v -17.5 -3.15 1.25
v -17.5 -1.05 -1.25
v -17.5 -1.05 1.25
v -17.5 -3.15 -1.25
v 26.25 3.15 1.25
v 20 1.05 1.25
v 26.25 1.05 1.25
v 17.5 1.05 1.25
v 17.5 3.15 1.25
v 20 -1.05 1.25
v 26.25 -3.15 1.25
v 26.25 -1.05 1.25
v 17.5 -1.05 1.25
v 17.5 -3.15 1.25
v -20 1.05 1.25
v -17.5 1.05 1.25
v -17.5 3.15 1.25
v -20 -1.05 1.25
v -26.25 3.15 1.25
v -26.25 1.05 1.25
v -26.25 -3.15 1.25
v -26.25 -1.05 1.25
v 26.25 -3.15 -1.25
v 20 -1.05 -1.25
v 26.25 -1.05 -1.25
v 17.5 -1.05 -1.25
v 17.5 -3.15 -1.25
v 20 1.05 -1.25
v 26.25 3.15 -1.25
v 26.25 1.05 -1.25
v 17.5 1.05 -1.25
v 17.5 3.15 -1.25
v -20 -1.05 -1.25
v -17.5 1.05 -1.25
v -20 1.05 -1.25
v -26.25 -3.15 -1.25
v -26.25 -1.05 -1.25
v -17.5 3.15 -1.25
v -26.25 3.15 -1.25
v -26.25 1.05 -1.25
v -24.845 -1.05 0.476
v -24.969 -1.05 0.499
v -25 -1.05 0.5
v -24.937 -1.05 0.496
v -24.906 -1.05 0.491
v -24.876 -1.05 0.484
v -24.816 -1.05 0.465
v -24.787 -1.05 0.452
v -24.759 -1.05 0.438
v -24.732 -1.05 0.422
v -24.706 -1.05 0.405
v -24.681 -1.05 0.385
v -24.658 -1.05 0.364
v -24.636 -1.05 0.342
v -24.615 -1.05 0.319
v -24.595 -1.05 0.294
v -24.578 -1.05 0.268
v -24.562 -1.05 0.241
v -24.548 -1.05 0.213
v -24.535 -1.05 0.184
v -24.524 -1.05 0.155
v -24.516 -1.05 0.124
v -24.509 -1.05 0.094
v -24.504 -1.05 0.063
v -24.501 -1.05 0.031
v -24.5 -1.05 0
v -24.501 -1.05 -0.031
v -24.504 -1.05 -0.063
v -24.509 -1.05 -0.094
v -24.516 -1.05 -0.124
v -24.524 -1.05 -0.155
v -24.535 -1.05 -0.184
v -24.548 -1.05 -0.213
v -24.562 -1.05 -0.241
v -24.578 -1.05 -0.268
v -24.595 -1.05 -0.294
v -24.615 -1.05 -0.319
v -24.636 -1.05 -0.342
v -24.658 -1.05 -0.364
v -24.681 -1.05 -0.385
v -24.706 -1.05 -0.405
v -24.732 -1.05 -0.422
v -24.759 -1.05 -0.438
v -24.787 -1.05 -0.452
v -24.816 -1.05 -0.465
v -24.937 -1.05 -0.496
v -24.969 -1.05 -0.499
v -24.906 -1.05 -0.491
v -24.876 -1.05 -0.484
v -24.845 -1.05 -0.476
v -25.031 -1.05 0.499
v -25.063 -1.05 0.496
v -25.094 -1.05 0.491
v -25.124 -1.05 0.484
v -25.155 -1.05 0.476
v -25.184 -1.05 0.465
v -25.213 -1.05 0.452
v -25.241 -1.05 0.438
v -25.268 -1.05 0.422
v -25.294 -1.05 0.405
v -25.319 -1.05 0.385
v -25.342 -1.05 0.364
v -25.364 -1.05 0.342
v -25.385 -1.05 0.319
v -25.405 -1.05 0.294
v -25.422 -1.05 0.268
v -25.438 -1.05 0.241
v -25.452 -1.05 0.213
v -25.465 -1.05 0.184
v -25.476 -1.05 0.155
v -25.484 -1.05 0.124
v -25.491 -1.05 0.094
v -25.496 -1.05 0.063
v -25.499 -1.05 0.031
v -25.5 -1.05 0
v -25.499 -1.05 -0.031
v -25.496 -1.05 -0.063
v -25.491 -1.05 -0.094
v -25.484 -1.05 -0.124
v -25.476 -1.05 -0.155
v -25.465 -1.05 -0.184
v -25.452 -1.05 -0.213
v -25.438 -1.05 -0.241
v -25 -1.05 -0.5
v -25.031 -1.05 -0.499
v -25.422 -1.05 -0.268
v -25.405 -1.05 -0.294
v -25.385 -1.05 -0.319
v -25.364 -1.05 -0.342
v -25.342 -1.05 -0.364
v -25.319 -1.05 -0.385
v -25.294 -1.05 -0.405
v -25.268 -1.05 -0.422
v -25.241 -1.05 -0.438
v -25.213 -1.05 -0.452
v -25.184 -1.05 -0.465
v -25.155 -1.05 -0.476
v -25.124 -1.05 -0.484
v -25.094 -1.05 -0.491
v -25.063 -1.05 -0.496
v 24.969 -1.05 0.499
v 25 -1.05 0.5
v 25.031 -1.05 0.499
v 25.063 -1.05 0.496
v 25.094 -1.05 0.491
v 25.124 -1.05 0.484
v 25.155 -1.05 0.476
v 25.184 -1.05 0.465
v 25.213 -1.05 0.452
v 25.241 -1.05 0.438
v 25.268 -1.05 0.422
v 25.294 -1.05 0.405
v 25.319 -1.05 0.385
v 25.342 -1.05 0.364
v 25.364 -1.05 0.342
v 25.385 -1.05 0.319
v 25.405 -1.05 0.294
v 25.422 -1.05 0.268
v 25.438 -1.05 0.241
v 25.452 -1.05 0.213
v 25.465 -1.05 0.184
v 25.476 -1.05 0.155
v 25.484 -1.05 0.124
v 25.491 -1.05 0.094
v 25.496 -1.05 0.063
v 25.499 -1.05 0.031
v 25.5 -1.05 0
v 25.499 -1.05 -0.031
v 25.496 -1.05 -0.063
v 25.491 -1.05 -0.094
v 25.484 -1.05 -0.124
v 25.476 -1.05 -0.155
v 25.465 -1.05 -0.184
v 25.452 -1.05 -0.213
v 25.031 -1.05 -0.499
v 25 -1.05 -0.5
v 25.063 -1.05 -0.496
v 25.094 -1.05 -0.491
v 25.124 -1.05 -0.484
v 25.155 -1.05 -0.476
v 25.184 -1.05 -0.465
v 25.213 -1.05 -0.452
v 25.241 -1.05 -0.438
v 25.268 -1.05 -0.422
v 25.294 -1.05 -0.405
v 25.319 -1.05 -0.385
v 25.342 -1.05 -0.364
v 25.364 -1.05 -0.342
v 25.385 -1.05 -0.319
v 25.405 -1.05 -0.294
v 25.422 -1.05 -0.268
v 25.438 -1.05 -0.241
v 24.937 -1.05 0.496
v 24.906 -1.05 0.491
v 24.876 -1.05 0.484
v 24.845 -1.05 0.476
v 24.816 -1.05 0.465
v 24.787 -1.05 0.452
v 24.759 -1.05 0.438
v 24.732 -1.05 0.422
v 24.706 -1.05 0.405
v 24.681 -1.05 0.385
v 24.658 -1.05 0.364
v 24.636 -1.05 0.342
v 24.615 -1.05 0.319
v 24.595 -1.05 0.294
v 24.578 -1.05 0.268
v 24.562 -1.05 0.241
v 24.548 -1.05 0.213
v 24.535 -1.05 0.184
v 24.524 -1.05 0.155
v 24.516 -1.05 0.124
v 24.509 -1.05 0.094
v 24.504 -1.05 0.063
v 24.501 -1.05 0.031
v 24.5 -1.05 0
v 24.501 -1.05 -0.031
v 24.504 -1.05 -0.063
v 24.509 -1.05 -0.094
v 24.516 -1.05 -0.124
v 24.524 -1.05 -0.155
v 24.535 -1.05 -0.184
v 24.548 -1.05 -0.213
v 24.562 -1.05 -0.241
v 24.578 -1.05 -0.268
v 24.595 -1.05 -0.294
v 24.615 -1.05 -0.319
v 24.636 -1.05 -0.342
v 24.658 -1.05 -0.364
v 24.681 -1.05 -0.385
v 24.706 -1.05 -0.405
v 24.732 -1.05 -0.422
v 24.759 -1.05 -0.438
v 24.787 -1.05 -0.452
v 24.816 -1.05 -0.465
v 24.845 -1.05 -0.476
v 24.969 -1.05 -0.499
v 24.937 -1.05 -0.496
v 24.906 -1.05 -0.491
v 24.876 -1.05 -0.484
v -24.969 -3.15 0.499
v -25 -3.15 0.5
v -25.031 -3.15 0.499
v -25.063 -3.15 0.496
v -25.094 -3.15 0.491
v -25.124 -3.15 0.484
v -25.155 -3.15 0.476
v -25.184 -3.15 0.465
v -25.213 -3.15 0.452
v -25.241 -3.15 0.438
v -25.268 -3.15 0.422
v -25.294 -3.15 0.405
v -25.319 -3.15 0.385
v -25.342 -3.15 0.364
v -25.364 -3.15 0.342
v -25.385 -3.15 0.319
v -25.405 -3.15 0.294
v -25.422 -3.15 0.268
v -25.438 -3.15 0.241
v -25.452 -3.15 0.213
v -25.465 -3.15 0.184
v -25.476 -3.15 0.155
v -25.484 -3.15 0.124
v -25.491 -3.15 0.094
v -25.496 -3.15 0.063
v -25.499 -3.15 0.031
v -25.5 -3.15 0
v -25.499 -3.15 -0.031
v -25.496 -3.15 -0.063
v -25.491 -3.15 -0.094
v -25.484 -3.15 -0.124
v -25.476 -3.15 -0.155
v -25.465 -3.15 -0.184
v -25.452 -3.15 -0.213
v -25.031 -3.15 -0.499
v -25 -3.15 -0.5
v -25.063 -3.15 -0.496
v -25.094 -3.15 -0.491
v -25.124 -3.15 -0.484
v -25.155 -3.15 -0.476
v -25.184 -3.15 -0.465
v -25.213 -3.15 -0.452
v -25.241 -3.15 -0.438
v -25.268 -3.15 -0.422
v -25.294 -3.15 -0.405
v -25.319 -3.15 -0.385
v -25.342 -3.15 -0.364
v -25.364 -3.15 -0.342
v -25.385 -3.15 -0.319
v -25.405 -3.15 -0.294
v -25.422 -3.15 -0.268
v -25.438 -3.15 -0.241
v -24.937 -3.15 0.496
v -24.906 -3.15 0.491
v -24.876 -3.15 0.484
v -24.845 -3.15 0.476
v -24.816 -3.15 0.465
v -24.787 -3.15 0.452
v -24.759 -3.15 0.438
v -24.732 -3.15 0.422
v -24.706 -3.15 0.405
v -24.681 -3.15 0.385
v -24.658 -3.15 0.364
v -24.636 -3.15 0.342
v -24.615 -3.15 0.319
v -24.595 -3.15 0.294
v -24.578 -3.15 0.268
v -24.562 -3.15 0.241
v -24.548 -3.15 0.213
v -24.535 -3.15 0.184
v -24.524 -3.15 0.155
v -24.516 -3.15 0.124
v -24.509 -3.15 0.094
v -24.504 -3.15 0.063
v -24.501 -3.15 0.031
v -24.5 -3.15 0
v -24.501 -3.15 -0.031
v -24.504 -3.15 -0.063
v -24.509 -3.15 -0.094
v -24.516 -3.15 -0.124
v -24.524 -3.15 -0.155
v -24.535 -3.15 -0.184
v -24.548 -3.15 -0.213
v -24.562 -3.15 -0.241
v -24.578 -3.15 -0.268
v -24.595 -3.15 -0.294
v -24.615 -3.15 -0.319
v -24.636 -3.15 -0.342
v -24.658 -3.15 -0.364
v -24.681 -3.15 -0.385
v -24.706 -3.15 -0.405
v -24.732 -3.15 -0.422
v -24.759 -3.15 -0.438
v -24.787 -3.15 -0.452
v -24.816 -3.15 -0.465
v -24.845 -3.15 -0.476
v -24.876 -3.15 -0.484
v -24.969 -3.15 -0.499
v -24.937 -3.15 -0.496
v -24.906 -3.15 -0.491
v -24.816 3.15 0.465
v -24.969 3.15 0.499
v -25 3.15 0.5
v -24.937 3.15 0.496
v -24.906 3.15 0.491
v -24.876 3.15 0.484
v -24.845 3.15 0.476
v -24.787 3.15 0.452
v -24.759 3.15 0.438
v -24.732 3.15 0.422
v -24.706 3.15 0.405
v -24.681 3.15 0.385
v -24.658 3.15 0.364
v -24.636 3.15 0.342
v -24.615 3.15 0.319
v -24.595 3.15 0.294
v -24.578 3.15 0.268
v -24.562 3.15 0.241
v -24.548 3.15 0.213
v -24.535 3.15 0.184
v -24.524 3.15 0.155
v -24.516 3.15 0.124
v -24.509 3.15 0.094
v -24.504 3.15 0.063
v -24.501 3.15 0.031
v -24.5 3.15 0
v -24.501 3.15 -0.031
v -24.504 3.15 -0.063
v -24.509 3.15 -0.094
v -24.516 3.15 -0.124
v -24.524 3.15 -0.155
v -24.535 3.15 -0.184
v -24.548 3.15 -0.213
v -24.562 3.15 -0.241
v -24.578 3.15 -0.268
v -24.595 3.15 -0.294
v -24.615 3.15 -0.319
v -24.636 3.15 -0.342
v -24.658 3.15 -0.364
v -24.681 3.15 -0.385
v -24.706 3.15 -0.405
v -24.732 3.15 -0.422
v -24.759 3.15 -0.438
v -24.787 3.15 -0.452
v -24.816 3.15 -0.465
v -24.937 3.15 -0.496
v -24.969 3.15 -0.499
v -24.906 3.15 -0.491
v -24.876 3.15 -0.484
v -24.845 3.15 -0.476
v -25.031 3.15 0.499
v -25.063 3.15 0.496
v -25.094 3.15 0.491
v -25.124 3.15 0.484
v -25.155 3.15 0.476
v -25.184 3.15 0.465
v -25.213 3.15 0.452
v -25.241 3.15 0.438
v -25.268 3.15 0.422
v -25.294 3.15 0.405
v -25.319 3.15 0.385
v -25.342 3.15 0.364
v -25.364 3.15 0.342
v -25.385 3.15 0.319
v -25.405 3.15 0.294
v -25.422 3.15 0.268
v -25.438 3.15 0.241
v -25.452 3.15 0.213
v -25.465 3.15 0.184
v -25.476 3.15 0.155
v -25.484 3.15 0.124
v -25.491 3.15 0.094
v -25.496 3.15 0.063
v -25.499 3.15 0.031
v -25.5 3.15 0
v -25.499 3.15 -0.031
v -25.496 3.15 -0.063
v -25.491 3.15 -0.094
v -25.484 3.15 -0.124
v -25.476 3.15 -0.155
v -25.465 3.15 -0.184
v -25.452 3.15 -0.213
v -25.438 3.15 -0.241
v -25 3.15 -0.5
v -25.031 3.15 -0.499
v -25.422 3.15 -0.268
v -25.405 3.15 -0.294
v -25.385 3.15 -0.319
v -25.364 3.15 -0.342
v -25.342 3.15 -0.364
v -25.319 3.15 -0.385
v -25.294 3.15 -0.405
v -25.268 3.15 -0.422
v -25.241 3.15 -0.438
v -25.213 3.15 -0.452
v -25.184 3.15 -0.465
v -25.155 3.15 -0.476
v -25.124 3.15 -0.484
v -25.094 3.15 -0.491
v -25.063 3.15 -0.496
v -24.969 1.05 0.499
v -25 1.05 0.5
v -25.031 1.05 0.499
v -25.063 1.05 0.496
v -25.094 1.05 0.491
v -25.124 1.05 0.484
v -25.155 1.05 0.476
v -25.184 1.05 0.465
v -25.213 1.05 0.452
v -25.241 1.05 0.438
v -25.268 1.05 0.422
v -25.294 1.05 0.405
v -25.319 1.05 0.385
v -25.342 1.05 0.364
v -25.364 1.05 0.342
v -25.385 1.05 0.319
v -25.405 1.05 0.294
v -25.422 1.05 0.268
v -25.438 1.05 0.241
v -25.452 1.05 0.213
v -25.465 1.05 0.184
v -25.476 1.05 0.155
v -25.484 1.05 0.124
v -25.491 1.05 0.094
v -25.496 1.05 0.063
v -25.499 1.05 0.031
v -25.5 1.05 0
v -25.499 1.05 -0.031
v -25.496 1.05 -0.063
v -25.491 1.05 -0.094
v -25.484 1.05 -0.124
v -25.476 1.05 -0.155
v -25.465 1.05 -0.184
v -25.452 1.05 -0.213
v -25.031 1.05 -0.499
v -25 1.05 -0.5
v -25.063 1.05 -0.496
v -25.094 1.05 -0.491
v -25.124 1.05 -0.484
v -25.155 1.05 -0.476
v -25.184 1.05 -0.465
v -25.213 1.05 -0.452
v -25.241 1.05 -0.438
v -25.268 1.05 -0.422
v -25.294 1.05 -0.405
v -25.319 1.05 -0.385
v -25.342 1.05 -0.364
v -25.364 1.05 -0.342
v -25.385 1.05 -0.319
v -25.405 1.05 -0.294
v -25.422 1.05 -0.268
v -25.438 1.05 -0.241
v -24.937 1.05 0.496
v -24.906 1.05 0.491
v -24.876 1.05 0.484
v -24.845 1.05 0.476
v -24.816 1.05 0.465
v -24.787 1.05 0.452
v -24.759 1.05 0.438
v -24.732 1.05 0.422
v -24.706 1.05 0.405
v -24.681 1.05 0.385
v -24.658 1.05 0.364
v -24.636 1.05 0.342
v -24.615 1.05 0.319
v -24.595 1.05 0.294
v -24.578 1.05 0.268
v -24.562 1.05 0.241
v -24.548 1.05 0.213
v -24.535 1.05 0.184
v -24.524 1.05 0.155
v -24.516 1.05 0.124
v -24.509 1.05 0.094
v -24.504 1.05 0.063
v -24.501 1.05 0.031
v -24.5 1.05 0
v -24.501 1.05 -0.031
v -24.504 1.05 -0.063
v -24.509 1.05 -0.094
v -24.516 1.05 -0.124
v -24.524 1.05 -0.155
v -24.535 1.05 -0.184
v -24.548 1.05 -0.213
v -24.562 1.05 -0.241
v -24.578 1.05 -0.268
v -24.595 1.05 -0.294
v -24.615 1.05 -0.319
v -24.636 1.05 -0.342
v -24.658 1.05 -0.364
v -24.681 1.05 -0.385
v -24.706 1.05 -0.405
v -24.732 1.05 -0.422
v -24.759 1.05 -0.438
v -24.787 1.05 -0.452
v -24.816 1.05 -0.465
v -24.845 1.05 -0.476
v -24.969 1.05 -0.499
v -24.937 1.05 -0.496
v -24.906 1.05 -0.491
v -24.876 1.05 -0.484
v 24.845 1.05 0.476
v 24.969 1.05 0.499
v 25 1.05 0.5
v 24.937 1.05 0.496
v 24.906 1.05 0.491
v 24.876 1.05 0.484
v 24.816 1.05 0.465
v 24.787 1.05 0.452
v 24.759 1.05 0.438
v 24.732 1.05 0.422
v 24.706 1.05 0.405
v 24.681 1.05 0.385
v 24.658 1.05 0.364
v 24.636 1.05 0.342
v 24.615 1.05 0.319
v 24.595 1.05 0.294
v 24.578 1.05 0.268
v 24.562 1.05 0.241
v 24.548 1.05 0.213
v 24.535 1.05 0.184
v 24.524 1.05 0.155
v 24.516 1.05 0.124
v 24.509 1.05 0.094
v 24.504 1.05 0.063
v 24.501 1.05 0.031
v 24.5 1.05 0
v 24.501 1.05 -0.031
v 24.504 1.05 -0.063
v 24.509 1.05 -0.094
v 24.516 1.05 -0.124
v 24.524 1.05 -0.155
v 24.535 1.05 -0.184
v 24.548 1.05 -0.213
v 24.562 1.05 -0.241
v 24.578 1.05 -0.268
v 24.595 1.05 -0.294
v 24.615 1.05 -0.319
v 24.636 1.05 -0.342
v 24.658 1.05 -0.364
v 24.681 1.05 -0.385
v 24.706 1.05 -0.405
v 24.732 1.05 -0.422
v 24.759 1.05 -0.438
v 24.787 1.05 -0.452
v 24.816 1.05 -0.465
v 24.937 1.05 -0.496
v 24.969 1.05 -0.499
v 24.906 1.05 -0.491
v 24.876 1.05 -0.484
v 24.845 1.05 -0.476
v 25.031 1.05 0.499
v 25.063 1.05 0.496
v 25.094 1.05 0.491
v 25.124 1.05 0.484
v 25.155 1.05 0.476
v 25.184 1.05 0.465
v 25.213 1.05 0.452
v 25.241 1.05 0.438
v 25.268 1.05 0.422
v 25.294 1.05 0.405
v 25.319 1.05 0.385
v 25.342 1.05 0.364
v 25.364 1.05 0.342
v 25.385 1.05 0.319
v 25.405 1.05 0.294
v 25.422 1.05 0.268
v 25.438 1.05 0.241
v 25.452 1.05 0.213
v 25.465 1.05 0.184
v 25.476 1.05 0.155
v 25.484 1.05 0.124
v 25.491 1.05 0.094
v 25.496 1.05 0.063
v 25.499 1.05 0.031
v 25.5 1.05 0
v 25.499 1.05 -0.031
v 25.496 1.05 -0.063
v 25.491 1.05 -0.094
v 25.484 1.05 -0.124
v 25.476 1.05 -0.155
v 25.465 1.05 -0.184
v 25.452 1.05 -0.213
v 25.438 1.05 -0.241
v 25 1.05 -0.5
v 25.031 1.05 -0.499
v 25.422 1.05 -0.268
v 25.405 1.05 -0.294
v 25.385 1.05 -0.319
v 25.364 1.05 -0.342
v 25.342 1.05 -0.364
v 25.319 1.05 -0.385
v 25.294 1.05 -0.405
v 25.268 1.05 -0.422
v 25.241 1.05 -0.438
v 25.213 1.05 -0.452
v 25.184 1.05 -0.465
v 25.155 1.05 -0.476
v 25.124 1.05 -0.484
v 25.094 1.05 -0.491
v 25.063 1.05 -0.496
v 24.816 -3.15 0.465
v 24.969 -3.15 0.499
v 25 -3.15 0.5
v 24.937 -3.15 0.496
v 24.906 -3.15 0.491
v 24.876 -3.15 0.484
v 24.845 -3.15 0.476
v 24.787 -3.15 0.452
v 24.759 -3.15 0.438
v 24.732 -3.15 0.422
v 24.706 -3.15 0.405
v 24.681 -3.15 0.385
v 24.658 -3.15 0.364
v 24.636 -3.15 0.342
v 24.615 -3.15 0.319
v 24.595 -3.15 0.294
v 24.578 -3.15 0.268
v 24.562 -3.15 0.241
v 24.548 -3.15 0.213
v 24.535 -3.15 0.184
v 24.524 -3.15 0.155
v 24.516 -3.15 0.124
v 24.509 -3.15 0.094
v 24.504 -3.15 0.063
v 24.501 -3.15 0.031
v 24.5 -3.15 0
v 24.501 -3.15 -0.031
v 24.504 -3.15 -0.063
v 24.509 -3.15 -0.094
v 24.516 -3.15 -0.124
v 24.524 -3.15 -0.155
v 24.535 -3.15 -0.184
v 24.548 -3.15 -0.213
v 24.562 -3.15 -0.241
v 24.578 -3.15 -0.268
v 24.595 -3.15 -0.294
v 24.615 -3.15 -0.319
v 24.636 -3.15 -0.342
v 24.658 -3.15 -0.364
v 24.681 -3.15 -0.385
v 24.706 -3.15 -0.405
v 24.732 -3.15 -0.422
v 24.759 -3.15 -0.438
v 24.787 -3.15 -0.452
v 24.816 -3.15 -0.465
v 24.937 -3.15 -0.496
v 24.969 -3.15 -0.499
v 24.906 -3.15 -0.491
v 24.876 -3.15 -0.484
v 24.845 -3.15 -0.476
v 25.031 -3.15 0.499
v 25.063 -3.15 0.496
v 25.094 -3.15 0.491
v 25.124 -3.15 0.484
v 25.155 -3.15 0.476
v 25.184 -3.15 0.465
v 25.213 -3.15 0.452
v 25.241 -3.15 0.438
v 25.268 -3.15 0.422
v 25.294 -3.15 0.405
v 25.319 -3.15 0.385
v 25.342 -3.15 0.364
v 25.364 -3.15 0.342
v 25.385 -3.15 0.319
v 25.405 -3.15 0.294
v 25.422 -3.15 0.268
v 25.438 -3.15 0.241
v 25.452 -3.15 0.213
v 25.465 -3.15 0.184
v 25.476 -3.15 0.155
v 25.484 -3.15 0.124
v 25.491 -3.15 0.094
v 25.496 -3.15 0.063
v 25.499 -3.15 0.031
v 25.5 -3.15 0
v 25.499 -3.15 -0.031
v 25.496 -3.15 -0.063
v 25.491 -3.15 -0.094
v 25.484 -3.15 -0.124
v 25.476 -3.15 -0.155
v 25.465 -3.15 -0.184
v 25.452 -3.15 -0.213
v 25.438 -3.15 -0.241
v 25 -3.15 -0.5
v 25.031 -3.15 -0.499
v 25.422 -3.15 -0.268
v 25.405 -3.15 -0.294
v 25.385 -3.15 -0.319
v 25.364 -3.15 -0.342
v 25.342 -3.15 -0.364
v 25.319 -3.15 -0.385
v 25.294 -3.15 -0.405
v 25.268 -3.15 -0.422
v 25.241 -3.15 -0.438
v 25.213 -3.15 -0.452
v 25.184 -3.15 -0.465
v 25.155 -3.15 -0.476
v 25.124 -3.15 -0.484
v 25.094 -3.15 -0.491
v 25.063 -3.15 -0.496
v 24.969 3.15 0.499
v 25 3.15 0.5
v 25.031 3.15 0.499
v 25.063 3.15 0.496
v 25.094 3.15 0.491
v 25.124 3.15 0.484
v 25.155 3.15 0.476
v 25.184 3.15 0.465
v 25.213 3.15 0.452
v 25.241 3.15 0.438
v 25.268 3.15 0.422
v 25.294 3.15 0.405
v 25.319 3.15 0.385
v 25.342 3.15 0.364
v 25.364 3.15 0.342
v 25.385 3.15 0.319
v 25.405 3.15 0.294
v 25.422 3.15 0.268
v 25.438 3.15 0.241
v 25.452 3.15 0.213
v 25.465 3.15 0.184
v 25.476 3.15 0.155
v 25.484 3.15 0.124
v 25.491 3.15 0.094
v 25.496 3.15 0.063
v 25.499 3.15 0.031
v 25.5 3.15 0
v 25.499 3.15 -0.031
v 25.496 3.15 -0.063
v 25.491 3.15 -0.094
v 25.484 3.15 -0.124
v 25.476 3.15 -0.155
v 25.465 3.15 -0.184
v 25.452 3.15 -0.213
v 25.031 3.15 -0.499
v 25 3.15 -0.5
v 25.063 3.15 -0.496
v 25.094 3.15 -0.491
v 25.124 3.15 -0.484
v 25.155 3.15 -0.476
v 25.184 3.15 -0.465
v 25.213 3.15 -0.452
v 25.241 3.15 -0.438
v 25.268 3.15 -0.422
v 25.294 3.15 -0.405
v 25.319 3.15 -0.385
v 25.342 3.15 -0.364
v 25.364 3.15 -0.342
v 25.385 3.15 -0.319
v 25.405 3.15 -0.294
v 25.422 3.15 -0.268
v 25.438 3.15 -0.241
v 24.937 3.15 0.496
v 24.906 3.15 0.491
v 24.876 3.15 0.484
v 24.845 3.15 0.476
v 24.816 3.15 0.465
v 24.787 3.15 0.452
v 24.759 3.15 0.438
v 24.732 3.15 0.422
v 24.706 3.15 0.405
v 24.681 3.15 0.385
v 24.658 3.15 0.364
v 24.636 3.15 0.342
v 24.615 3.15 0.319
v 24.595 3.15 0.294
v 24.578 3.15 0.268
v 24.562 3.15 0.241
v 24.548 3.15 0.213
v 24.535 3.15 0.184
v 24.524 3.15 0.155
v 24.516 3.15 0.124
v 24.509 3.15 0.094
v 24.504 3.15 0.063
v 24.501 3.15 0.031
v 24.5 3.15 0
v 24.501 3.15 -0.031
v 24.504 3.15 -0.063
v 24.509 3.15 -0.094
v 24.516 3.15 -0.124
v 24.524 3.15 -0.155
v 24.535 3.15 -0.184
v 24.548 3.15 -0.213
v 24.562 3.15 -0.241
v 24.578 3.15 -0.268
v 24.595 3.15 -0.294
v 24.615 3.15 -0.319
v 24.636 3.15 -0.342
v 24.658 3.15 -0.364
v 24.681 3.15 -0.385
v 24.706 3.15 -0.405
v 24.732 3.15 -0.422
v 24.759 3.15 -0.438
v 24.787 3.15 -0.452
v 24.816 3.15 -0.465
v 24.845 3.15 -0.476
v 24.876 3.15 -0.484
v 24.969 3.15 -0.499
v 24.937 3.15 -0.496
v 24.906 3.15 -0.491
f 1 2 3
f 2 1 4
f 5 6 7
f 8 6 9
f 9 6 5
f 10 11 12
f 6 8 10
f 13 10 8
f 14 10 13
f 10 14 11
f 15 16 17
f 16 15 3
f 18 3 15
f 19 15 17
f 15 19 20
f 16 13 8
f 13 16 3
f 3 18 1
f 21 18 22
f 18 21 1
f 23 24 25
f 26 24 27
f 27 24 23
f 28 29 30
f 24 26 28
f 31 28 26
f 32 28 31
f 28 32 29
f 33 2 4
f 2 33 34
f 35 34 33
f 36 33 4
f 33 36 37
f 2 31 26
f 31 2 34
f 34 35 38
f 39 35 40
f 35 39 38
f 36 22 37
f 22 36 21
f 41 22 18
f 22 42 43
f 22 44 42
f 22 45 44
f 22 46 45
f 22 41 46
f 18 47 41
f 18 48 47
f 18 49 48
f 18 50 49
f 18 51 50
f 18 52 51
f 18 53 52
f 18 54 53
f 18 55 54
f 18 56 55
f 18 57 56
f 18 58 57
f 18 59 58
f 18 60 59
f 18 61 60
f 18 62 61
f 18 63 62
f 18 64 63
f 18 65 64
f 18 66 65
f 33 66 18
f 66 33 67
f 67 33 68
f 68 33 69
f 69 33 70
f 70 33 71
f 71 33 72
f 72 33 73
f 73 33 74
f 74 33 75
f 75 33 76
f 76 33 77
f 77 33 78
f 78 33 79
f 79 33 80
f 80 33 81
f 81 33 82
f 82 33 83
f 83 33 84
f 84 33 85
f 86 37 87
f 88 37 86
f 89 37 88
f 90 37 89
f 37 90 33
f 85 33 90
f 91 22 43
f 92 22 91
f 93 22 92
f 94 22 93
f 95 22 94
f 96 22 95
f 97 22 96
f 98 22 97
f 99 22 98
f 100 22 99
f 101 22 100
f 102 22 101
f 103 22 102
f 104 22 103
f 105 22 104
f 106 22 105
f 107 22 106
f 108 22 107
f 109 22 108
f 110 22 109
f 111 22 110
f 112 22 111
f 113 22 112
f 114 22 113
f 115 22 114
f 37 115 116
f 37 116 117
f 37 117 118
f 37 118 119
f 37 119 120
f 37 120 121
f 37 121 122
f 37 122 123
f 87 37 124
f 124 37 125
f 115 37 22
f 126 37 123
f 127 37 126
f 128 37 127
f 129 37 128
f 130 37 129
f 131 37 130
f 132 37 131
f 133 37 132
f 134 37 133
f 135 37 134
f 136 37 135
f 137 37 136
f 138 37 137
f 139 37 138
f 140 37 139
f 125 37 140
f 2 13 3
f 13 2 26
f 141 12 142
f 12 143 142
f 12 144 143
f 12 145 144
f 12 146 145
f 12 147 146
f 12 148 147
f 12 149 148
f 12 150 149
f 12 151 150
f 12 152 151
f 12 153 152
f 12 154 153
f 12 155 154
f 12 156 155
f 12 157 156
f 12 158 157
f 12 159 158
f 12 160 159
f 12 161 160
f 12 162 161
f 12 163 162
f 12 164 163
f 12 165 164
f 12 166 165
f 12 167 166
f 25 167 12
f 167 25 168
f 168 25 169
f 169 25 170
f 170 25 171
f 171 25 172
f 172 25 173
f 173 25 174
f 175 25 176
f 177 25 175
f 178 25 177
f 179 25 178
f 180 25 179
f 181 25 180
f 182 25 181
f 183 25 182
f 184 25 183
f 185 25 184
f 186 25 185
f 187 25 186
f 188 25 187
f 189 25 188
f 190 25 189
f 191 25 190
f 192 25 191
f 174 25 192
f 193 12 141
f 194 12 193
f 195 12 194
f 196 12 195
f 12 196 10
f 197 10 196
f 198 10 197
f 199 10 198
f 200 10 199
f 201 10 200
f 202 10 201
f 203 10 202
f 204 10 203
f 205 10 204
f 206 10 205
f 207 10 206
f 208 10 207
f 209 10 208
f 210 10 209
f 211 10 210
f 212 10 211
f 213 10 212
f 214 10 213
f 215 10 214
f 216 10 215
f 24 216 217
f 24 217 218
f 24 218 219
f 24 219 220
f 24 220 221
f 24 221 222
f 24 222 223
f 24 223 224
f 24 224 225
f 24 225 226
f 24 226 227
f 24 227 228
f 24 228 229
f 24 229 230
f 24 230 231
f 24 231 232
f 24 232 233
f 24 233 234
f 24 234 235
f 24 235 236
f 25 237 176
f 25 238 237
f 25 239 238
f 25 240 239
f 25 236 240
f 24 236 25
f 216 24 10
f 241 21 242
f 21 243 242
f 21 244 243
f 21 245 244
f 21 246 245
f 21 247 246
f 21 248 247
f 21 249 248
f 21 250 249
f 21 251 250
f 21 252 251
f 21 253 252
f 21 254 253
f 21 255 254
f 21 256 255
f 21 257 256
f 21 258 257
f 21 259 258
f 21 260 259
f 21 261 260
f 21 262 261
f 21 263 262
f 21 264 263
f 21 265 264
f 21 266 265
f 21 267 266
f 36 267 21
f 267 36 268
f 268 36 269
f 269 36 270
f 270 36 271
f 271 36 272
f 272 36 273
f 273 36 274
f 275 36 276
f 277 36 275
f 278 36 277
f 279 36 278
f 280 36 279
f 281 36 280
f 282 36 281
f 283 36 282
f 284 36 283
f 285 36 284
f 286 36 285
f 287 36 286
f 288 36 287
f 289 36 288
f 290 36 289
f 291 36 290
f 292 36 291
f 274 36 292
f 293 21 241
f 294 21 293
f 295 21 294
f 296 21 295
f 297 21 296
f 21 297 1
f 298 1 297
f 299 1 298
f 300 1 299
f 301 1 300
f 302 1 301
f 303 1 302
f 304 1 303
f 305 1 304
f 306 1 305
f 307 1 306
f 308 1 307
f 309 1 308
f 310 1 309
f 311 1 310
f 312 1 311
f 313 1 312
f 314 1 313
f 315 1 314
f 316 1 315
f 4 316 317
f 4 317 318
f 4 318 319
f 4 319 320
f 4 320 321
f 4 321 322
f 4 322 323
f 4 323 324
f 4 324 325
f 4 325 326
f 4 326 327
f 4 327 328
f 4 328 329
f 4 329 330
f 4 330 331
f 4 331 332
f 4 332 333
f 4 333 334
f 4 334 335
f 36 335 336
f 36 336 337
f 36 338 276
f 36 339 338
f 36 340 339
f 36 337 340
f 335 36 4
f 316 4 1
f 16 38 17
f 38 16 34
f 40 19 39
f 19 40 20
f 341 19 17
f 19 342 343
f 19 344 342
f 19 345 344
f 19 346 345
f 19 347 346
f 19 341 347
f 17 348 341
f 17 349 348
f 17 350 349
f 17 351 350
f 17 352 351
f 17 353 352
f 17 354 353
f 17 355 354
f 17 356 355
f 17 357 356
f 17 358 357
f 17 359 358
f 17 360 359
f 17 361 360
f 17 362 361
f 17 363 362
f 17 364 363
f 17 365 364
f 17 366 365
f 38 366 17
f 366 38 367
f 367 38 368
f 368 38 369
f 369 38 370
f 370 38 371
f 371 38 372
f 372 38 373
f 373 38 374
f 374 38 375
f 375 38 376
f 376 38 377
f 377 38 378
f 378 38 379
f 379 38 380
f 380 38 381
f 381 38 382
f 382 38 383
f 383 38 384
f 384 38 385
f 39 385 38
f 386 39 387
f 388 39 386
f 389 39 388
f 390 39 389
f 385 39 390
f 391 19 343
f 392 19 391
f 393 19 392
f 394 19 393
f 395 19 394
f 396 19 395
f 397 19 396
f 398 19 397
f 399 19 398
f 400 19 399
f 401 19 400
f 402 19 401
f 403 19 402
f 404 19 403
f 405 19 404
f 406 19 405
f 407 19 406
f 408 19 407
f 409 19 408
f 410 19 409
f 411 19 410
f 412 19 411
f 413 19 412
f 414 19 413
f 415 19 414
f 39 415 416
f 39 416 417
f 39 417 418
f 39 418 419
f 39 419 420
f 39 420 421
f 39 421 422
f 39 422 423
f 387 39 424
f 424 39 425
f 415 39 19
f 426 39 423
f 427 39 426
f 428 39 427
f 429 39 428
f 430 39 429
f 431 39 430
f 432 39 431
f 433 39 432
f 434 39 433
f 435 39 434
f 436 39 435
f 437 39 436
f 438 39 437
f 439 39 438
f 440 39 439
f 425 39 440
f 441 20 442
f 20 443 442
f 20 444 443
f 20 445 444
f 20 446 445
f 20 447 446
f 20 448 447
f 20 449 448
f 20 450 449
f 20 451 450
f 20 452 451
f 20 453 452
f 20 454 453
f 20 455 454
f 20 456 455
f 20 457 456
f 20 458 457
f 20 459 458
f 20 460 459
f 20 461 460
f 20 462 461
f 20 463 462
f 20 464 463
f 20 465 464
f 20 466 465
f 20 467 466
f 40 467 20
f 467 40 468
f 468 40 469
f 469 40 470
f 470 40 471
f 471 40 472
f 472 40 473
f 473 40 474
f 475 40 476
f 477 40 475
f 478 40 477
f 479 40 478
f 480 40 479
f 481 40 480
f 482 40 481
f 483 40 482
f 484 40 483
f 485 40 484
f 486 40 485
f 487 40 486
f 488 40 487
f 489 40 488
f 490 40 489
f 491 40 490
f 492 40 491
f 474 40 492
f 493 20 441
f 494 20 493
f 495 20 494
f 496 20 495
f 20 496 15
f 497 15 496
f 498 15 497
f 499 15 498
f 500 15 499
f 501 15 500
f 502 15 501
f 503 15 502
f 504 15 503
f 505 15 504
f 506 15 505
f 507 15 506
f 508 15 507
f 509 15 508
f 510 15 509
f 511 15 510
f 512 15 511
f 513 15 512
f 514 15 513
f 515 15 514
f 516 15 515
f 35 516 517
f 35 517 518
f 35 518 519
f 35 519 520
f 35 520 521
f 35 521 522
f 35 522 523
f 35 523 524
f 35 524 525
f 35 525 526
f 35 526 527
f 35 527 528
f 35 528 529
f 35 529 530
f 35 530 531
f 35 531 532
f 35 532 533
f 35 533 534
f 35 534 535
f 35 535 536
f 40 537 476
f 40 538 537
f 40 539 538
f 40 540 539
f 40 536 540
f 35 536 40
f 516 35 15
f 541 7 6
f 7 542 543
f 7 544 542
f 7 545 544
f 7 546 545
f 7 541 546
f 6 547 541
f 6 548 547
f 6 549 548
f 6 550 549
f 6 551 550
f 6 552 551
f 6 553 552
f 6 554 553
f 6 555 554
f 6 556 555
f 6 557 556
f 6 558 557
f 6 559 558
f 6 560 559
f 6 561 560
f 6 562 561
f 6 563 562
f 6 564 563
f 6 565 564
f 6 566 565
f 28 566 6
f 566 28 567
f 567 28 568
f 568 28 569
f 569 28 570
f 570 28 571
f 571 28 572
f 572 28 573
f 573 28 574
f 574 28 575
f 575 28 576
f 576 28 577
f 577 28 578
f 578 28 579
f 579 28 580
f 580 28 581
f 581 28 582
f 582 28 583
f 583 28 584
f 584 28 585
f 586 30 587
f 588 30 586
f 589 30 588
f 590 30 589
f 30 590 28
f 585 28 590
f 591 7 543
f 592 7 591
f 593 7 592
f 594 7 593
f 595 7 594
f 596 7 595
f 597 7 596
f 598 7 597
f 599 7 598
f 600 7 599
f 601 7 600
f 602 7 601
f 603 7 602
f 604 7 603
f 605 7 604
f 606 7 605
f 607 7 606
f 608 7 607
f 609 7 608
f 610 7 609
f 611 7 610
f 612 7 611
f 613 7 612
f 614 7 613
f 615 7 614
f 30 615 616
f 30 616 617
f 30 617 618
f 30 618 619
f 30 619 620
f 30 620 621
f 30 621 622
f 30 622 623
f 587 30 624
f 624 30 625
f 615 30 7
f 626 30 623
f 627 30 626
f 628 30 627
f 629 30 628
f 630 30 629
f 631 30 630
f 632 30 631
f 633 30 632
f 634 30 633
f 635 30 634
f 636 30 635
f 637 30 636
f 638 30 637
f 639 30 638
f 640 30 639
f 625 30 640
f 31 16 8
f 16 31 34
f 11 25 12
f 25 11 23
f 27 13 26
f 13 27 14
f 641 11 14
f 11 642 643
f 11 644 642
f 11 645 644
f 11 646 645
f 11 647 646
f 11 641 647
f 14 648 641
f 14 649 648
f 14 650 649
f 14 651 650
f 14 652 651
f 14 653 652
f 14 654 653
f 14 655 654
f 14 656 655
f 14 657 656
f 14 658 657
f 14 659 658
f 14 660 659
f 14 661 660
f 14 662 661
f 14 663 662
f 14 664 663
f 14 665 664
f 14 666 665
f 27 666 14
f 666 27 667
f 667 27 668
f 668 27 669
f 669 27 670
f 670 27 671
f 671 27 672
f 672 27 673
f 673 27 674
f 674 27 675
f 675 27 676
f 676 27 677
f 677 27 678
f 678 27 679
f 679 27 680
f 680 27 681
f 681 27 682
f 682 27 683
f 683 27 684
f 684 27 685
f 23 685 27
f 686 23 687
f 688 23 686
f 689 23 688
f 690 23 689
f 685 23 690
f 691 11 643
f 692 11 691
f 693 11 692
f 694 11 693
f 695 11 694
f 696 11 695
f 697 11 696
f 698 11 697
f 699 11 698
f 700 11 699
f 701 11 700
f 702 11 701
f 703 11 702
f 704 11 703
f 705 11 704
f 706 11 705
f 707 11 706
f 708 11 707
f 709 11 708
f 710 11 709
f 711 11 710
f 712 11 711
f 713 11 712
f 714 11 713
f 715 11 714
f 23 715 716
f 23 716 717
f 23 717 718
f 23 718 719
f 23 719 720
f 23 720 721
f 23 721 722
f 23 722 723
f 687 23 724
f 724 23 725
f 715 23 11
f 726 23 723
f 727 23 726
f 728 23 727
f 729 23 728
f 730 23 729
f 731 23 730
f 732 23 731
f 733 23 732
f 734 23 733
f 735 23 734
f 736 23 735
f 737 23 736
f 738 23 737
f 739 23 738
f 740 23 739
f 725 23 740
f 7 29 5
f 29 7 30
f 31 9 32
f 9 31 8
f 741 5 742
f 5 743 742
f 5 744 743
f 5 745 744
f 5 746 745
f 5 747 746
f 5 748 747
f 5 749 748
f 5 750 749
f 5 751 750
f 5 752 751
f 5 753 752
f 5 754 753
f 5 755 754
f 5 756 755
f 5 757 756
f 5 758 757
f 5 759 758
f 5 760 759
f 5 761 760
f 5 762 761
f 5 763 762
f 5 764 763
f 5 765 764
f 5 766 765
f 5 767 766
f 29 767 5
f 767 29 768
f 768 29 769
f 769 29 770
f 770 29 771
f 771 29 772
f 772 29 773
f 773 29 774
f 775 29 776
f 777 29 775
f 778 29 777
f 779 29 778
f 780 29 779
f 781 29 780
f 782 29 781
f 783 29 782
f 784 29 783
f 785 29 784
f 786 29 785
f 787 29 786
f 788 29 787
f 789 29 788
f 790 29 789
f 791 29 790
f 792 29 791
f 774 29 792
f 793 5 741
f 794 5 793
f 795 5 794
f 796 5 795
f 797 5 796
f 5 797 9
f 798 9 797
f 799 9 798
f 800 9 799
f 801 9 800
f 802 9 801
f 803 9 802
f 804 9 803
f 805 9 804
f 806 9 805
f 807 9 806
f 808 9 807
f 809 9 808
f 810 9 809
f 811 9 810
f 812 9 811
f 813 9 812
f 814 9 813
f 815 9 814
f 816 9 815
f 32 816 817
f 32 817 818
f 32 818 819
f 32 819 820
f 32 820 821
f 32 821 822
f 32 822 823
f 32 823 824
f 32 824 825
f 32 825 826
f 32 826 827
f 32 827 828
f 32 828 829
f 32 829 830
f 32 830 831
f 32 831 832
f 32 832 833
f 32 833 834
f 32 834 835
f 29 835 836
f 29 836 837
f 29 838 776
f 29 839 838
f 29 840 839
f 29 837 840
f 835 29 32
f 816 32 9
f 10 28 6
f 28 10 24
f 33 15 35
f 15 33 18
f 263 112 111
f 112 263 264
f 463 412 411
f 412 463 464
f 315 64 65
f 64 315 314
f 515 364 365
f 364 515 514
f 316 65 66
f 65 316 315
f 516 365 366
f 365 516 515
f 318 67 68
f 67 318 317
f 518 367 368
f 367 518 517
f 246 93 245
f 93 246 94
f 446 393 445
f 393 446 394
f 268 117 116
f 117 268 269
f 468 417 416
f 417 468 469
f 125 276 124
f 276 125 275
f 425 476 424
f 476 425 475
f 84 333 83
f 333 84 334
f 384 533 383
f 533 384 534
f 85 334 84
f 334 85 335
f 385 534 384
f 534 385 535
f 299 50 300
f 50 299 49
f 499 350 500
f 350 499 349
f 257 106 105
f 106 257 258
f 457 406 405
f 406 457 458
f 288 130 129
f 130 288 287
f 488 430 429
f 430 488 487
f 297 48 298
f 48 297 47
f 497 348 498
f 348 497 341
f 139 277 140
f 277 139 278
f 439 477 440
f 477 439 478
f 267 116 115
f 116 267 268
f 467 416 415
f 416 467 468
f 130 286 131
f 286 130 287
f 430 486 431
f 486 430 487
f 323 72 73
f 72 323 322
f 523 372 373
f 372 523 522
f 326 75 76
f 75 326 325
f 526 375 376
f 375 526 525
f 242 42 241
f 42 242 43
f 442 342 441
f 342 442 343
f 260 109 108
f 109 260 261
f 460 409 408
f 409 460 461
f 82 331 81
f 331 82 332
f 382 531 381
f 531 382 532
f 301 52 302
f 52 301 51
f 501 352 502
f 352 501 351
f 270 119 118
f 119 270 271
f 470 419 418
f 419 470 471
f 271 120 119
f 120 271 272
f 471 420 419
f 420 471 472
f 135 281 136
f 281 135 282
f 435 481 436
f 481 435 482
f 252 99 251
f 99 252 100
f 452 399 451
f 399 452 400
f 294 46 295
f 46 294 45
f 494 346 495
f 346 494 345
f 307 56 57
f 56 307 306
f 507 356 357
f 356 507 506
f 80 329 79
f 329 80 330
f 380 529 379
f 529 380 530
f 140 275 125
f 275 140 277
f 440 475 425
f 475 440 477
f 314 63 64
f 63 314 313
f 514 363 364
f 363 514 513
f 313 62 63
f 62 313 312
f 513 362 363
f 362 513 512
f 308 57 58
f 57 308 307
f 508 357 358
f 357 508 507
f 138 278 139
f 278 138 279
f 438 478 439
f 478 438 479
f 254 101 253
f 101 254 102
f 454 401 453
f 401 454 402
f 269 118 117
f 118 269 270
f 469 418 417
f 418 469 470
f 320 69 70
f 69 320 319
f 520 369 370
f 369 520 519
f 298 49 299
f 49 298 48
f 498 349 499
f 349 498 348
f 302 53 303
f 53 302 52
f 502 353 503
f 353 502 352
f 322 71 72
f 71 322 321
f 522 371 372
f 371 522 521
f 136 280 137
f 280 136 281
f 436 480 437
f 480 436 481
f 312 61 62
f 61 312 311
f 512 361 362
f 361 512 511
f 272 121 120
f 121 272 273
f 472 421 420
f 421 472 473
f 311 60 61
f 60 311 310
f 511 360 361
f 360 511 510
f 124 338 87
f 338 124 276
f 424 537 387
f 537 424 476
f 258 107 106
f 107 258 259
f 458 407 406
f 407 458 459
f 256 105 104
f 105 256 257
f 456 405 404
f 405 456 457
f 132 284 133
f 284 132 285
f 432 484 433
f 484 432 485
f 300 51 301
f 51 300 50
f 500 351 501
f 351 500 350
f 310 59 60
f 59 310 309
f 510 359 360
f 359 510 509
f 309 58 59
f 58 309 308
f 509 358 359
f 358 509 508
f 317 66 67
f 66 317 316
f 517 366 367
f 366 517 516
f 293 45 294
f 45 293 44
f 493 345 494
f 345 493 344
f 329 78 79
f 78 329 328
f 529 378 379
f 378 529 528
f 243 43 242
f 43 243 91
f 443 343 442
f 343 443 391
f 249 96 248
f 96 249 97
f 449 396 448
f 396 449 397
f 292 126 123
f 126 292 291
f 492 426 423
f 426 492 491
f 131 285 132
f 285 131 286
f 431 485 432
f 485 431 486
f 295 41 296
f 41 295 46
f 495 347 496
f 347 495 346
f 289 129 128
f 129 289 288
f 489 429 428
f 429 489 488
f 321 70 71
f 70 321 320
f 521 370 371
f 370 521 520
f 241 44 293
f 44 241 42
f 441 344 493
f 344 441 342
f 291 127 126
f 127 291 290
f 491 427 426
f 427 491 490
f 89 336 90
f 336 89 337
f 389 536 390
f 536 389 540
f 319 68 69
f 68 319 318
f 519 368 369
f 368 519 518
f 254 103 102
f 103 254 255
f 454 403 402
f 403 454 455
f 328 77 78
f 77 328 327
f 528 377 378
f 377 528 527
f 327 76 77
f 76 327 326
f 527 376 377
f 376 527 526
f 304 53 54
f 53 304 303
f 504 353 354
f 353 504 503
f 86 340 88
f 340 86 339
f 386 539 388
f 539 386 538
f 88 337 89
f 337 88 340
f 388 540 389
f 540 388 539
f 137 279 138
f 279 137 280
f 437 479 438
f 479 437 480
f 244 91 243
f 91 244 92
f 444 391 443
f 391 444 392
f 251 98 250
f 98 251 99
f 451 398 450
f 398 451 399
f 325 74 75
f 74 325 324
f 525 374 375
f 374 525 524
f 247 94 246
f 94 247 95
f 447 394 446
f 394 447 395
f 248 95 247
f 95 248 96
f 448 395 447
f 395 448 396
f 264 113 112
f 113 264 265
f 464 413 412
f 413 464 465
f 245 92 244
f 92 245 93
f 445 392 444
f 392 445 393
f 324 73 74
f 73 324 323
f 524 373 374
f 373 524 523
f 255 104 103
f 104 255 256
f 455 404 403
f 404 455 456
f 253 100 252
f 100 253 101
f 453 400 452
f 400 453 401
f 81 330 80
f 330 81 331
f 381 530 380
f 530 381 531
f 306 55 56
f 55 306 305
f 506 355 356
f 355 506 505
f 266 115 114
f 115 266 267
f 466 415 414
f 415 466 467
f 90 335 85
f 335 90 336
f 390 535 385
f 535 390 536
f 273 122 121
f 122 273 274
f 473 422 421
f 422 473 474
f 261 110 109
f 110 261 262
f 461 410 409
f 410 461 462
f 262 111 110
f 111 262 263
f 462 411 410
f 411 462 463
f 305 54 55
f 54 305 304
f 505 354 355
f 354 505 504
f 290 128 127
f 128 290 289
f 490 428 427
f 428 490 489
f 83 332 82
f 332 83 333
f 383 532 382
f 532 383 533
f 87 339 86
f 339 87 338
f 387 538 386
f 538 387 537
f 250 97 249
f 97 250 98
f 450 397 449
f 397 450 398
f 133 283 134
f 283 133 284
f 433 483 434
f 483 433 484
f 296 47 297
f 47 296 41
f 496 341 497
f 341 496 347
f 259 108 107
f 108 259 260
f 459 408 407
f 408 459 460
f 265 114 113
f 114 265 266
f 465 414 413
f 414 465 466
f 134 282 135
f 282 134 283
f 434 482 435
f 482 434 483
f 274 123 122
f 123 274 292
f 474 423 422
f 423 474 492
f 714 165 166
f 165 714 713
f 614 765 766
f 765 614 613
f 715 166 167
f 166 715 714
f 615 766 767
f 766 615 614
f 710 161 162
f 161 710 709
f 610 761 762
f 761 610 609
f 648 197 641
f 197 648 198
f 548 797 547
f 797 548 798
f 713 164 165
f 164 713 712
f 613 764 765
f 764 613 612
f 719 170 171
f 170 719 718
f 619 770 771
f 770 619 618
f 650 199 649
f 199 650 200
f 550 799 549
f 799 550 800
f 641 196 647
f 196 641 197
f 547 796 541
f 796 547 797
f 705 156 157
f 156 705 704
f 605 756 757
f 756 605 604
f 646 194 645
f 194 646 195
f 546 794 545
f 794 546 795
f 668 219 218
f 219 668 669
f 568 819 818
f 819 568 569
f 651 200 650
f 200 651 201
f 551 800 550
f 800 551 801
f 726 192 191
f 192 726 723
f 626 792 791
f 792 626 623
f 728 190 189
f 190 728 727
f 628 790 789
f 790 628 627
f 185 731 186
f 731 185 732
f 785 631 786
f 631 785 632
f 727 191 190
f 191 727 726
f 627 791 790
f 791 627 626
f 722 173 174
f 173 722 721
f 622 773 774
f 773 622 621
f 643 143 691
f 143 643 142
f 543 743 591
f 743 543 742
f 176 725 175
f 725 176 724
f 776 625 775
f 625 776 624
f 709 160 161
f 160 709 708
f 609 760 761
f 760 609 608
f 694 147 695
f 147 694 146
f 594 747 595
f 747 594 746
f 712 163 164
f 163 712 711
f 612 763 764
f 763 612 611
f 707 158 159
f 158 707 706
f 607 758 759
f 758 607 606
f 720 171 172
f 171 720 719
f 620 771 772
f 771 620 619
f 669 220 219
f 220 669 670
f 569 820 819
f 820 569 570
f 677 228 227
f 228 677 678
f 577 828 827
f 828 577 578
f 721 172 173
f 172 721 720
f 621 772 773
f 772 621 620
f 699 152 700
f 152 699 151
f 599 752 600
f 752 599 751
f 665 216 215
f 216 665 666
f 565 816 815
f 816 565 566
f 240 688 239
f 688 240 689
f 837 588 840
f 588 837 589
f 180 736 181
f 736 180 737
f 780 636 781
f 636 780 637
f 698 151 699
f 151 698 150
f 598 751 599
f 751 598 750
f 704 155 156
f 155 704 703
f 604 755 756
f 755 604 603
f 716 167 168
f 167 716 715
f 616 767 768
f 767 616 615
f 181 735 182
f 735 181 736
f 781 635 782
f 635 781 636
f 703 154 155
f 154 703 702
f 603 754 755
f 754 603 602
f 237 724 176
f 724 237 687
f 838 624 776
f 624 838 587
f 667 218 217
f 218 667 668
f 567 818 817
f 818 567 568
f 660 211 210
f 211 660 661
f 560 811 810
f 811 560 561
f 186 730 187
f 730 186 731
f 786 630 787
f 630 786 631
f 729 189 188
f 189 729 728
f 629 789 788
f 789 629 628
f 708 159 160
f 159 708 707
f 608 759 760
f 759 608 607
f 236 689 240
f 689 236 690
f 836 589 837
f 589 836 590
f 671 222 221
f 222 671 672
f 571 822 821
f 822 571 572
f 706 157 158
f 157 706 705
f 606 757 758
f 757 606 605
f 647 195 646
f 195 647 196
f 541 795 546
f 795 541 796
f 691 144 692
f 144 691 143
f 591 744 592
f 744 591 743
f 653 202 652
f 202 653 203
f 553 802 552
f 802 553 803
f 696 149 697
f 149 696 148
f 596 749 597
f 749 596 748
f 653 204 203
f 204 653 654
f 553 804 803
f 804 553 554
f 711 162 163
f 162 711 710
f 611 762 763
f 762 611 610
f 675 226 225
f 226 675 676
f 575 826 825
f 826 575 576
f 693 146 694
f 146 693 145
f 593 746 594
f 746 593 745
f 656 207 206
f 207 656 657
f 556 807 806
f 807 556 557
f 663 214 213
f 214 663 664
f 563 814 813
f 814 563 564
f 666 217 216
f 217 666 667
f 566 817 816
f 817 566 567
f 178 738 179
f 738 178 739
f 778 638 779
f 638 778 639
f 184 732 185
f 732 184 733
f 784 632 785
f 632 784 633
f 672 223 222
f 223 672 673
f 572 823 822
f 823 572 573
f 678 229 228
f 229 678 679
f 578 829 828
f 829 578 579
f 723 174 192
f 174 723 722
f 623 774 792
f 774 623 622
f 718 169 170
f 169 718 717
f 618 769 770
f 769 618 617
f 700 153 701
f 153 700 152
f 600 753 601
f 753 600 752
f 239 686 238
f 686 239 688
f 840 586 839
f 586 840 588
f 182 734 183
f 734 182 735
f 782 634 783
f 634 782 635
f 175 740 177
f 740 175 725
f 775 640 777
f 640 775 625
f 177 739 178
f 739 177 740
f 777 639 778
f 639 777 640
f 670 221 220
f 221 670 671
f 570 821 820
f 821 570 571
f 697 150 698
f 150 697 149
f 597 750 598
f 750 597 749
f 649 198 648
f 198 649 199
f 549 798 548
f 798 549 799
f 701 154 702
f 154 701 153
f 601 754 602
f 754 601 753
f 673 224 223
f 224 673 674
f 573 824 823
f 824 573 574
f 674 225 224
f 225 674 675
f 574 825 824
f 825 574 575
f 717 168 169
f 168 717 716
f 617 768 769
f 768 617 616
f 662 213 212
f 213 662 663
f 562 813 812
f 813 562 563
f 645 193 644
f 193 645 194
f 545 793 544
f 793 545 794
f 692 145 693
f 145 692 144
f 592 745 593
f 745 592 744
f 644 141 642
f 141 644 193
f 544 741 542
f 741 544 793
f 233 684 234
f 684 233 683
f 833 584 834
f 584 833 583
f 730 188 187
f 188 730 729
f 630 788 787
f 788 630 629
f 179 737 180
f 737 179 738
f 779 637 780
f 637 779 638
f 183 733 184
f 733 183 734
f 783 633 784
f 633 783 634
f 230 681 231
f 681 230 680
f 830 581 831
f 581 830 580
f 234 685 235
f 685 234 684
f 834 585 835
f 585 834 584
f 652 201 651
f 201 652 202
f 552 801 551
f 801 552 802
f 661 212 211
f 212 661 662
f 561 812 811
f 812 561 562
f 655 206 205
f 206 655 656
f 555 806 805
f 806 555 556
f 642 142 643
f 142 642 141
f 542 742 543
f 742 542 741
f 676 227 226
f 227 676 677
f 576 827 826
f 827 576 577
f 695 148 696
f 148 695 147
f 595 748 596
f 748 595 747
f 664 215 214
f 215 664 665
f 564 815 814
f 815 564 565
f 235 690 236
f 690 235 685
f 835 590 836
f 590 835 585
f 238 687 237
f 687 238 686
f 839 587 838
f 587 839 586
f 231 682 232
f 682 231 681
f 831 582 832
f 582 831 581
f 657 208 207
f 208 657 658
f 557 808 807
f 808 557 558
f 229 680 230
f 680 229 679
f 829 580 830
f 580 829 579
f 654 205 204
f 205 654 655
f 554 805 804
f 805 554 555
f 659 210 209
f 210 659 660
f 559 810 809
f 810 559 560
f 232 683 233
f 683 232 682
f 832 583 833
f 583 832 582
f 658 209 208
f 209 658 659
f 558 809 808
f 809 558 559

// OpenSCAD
$fs = 0.01;
$fn = 100;

length = 50;
thick = 2.1;
height = 2.5;
space = 5;
hole_diam = 1;

difference()
{
    union()
    {
        cube([length-2*space,thick,height], true);
        for (sign_x = [-1,1])
        {
            for (y = [-thick, thick])
            {
                c = space+height/2+height;
                x = sign_x*(length/2-(c-height)/2);
                translate([x,y,0])
                cube([c,thick,height], true);
            }
        }
    }

    for (x = [-length/2, length/2])
    {
        color("green")
        rotate(90, [1,0,0])
        translate([x,0,0])
        cylinder(3*thick+$fs, hole_diam/2,hole_diam/2 ,true);
    }
}
